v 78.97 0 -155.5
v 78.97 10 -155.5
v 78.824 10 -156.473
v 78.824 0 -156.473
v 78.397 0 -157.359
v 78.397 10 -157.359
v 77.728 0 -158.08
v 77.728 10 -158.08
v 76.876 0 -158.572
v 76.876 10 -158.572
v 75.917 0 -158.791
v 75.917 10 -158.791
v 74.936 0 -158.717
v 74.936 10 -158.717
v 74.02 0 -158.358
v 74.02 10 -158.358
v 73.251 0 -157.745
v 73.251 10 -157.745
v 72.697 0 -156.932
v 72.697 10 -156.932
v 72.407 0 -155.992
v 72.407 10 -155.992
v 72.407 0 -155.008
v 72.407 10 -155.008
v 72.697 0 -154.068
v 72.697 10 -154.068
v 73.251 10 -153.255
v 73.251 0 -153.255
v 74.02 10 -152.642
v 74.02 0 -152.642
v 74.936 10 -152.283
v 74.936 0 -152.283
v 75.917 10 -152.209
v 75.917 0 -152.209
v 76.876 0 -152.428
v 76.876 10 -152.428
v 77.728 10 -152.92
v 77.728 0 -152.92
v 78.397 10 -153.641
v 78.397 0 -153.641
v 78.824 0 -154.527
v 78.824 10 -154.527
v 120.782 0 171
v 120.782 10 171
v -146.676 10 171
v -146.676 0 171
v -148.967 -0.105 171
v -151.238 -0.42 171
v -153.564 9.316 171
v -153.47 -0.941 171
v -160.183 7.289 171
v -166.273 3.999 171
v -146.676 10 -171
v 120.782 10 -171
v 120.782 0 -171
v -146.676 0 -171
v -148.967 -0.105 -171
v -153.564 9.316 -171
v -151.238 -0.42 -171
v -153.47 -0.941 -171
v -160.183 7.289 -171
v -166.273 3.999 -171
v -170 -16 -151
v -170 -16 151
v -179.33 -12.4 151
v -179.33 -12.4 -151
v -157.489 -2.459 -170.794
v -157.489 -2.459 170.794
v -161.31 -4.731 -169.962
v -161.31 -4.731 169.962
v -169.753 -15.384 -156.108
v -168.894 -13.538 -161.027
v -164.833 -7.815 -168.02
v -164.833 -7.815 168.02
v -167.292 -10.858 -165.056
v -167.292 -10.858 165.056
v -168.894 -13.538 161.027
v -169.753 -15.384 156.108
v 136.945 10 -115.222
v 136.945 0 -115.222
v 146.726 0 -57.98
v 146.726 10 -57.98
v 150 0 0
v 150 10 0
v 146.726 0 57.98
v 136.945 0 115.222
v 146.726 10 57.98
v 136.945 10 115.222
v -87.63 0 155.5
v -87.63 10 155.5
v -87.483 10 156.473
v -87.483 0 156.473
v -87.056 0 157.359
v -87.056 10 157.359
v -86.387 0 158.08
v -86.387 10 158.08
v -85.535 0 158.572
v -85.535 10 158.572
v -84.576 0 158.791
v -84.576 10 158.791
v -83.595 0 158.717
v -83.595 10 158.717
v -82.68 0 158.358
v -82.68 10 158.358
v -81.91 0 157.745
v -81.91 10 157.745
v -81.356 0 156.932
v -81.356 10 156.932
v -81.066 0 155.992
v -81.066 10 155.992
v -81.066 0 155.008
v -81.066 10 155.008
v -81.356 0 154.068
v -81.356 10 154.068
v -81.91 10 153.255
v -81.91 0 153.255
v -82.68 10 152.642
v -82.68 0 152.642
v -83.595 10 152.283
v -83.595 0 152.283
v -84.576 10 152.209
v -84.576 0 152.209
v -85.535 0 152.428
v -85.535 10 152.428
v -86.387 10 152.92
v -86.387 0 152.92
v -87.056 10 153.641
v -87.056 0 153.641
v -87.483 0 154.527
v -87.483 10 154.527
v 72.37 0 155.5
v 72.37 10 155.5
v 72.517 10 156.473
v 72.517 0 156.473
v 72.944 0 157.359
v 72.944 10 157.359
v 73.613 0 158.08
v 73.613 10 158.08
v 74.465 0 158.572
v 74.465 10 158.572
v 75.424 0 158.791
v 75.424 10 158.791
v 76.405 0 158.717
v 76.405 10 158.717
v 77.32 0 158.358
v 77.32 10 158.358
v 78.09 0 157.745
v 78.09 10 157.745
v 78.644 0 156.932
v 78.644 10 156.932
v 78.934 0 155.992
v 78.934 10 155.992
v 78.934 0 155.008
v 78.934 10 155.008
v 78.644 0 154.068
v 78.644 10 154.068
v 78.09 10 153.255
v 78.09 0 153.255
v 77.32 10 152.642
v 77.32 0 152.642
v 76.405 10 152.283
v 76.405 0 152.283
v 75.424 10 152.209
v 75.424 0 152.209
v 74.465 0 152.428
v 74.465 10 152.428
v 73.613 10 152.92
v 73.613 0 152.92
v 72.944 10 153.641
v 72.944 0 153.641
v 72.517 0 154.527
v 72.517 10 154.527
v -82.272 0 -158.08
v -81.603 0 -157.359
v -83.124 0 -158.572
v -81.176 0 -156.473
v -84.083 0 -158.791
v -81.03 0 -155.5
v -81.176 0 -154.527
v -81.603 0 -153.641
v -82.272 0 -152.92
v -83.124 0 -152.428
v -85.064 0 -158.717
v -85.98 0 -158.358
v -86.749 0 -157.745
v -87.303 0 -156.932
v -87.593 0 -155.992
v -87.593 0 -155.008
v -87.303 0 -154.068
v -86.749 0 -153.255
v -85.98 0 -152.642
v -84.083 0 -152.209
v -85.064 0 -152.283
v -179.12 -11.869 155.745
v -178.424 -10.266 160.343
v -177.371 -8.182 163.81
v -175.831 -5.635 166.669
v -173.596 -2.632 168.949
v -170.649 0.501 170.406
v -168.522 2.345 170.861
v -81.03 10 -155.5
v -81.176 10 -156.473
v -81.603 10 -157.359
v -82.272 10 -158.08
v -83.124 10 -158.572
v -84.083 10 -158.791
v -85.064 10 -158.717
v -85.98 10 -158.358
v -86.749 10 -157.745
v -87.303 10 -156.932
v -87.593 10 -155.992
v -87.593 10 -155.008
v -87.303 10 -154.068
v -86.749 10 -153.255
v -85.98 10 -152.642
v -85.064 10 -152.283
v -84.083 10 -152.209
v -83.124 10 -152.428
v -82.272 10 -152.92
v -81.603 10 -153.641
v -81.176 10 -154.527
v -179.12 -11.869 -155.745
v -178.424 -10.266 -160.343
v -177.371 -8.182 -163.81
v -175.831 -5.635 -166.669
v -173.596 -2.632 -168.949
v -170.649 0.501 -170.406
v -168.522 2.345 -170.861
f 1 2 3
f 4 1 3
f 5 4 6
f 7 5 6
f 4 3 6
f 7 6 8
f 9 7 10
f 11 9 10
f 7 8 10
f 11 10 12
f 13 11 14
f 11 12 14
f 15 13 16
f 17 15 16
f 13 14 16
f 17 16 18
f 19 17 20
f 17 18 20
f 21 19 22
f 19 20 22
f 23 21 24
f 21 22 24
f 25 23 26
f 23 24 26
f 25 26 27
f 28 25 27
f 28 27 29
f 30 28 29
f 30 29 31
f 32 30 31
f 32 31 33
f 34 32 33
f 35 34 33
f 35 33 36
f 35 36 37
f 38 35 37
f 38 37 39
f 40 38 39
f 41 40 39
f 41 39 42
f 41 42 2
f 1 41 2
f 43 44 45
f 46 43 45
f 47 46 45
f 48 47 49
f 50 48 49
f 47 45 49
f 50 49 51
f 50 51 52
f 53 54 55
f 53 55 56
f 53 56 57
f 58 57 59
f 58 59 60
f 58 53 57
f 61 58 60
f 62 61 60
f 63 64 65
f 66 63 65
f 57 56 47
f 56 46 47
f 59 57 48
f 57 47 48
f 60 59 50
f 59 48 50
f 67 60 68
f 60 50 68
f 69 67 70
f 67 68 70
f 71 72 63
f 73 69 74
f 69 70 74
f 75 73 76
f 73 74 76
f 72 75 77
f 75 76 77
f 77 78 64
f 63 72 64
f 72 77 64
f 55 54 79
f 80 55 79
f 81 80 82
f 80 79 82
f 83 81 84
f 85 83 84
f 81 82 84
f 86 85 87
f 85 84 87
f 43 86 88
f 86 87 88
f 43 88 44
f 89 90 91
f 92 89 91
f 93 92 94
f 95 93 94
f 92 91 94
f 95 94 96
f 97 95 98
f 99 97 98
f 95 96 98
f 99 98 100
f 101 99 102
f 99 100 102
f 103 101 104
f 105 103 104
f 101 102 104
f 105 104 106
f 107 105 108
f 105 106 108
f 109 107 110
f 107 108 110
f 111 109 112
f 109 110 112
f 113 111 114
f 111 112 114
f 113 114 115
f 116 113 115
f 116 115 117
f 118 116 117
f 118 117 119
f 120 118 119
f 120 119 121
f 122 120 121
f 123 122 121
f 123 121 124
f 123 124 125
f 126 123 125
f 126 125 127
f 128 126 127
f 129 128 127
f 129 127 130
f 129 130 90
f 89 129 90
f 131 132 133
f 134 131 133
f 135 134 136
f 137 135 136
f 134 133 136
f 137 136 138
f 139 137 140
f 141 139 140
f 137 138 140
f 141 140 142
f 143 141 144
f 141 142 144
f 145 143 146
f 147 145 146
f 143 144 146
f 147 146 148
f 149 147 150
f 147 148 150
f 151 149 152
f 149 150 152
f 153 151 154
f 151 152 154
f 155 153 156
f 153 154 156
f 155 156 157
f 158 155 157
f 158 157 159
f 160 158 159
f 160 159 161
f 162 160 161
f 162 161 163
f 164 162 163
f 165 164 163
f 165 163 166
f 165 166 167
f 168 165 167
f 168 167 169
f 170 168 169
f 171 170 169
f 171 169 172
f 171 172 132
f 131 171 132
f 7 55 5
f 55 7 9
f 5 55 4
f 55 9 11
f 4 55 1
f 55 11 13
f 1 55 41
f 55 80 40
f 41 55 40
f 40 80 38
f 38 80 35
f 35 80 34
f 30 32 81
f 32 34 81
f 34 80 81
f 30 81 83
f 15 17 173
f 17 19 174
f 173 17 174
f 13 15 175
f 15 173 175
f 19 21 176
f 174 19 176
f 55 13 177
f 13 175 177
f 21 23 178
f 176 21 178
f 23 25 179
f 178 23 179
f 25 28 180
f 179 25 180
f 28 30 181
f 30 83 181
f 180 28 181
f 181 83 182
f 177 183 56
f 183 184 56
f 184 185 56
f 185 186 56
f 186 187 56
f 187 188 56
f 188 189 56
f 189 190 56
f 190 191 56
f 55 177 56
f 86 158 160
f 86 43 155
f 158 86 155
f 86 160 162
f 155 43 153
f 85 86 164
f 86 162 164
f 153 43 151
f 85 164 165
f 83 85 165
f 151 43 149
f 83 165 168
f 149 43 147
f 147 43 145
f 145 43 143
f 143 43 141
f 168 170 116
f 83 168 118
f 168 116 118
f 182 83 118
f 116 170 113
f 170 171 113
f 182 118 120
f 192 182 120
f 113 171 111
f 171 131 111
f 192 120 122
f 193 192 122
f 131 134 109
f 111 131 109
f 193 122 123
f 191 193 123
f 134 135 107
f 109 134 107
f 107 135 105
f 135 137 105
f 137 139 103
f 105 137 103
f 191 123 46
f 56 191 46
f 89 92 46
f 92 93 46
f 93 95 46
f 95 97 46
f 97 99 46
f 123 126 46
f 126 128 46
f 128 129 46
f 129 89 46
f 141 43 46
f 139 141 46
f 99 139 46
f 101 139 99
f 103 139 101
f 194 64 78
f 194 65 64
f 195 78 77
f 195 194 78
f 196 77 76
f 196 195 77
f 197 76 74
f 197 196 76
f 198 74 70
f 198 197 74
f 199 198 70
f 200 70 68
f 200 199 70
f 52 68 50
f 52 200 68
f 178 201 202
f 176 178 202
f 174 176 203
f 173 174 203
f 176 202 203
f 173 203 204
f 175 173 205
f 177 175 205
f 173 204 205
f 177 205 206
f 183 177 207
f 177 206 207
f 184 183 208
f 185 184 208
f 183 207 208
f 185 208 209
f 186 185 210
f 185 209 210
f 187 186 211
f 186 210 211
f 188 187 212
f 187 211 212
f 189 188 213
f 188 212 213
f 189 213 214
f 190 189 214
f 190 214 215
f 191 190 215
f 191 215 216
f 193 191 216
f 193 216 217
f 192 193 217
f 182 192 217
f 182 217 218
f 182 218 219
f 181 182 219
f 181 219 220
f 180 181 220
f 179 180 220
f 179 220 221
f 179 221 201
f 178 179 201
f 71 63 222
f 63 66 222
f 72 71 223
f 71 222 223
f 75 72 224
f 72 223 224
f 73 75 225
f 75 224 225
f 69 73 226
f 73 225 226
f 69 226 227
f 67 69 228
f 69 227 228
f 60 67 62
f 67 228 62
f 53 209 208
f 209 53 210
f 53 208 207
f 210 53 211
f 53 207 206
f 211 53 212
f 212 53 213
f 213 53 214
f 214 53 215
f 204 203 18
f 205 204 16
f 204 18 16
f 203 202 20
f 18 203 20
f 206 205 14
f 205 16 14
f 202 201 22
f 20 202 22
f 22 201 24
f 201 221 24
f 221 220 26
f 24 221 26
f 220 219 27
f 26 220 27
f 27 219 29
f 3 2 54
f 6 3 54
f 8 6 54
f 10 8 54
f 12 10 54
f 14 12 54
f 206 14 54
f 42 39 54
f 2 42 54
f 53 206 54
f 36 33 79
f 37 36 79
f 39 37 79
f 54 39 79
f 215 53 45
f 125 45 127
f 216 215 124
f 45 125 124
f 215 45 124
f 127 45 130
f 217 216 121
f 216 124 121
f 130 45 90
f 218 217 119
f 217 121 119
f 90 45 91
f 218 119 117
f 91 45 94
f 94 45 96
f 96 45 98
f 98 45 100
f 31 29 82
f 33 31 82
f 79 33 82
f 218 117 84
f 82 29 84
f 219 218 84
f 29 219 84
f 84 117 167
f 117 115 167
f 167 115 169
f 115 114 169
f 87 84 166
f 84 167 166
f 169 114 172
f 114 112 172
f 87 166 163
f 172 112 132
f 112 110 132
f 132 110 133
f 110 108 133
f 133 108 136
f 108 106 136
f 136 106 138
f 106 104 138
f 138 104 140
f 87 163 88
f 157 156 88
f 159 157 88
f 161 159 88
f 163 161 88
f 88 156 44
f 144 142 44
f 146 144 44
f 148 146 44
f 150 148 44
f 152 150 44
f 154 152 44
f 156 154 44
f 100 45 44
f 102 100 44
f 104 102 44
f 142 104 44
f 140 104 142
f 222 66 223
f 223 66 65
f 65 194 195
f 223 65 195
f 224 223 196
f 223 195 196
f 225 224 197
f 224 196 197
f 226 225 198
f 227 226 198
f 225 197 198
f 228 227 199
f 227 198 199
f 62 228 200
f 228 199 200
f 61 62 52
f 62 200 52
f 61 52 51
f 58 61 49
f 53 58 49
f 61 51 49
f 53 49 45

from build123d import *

# Parameters (mm, degrees)
SM_BASE_FLANGE_1_DEPTH = 171
SKETCH_5_OUTSIDE_W     = 426.43
SKETCH_5_OUTSIDE_H     = 439.1
SKETCH_5_OUTSIDE_R     = 515
CUT_EXTRUDE_2_DEPTH    = 250.150713085
FILLET_1_R             = 20
SKETCH_9_R             = 3.3
CUT_EXTRUDE_4_DEPTH    = 250.150713236


# Sheet-metal steps are written as plain solids
with BuildPart() as part:
    # Sketch 1 → Базовая кромка1 (new, symmetric)
    with BuildSketch(Plane.XY):
        with BuildLine():
            Line((150, 0), (-146.676192421, 0))
            ThreePointArc((-146.676192421, 0), (-160.818328044, -4.384471872), (-170, -16))
            Line((-170, -16), (-179.329523032, -12.4))
            ThreePointArc((-179.329523032, -12.4), (-166.475182294, 3.861739379), (-146.676192421, 10))
            Line((-146.676192421, 10), (150, 10))
            Line((150, 10), (150, 0))
        make_face()
    extrude(amount=SM_BASE_FLANGE_1_DEPTH, both=True)

    # Эскиз5 outside → Вырез-Вытянуть2 (cut, through all)
    with BuildSketch(Plane(origin=(0, 10, 0), x_dir=(1, 0, 0), z_dir=(0, 1, 0))):
        with Locations((-14.665, 0)):
            Rectangle(SKETCH_5_OUTSIDE_W, SKETCH_5_OUTSIDE_H)
        with Locations((-365, 0)):
            Circle(SKETCH_5_OUTSIDE_R, mode=Mode.SUBTRACT)
    extrude(amount=-CUT_EXTRUDE_2_DEPTH, mode=Mode.SUBTRACT)


with BuildPart() as cut_extrude_2_kept_piece:
    # of the separate pieces the step leaves, the one the design keeps (cut_extrude_2_pieces_kept)
    add(part.part.solids().sort_by_distance((-146.676192421, 10, -171))[0])

    # Скругление1
    fillet_1_edges = [cut_extrude_2_kept_piece.edges().sort_by_distance(p)[0] for p in [
        (-174.664761516, -14.2, -171),
        (-174.664761516, -14.2, 171),
    ]]
    fillet(fillet_1_edges, radius=FILLET_1_R)

    # Эскиз9 → Вырез-Вытянуть4 (cut, through all)
    with BuildSketch(Plane(origin=(0, 10, 0), x_dir=(1, 0, 0), z_dir=(0, 1, 0))):
        with Locations(Location((75.670476968, -155.5, 0), (0, 0, 180))):
            Circle(SKETCH_9_R)
        with Locations(Location((-84.329523032, -155.5, 0), (0, 0, 180))):
            Circle(SKETCH_9_R)
        with Locations((-84.329523032, 155.5)):
            Circle(SKETCH_9_R)
        with Locations((75.670476968, 155.5)):
            Circle(SKETCH_9_R)
    extrude(amount=-CUT_EXTRUDE_4_DEPTH, mode=Mode.SUBTRACT)


solid = cut_extrude_2_kept_piece.part
